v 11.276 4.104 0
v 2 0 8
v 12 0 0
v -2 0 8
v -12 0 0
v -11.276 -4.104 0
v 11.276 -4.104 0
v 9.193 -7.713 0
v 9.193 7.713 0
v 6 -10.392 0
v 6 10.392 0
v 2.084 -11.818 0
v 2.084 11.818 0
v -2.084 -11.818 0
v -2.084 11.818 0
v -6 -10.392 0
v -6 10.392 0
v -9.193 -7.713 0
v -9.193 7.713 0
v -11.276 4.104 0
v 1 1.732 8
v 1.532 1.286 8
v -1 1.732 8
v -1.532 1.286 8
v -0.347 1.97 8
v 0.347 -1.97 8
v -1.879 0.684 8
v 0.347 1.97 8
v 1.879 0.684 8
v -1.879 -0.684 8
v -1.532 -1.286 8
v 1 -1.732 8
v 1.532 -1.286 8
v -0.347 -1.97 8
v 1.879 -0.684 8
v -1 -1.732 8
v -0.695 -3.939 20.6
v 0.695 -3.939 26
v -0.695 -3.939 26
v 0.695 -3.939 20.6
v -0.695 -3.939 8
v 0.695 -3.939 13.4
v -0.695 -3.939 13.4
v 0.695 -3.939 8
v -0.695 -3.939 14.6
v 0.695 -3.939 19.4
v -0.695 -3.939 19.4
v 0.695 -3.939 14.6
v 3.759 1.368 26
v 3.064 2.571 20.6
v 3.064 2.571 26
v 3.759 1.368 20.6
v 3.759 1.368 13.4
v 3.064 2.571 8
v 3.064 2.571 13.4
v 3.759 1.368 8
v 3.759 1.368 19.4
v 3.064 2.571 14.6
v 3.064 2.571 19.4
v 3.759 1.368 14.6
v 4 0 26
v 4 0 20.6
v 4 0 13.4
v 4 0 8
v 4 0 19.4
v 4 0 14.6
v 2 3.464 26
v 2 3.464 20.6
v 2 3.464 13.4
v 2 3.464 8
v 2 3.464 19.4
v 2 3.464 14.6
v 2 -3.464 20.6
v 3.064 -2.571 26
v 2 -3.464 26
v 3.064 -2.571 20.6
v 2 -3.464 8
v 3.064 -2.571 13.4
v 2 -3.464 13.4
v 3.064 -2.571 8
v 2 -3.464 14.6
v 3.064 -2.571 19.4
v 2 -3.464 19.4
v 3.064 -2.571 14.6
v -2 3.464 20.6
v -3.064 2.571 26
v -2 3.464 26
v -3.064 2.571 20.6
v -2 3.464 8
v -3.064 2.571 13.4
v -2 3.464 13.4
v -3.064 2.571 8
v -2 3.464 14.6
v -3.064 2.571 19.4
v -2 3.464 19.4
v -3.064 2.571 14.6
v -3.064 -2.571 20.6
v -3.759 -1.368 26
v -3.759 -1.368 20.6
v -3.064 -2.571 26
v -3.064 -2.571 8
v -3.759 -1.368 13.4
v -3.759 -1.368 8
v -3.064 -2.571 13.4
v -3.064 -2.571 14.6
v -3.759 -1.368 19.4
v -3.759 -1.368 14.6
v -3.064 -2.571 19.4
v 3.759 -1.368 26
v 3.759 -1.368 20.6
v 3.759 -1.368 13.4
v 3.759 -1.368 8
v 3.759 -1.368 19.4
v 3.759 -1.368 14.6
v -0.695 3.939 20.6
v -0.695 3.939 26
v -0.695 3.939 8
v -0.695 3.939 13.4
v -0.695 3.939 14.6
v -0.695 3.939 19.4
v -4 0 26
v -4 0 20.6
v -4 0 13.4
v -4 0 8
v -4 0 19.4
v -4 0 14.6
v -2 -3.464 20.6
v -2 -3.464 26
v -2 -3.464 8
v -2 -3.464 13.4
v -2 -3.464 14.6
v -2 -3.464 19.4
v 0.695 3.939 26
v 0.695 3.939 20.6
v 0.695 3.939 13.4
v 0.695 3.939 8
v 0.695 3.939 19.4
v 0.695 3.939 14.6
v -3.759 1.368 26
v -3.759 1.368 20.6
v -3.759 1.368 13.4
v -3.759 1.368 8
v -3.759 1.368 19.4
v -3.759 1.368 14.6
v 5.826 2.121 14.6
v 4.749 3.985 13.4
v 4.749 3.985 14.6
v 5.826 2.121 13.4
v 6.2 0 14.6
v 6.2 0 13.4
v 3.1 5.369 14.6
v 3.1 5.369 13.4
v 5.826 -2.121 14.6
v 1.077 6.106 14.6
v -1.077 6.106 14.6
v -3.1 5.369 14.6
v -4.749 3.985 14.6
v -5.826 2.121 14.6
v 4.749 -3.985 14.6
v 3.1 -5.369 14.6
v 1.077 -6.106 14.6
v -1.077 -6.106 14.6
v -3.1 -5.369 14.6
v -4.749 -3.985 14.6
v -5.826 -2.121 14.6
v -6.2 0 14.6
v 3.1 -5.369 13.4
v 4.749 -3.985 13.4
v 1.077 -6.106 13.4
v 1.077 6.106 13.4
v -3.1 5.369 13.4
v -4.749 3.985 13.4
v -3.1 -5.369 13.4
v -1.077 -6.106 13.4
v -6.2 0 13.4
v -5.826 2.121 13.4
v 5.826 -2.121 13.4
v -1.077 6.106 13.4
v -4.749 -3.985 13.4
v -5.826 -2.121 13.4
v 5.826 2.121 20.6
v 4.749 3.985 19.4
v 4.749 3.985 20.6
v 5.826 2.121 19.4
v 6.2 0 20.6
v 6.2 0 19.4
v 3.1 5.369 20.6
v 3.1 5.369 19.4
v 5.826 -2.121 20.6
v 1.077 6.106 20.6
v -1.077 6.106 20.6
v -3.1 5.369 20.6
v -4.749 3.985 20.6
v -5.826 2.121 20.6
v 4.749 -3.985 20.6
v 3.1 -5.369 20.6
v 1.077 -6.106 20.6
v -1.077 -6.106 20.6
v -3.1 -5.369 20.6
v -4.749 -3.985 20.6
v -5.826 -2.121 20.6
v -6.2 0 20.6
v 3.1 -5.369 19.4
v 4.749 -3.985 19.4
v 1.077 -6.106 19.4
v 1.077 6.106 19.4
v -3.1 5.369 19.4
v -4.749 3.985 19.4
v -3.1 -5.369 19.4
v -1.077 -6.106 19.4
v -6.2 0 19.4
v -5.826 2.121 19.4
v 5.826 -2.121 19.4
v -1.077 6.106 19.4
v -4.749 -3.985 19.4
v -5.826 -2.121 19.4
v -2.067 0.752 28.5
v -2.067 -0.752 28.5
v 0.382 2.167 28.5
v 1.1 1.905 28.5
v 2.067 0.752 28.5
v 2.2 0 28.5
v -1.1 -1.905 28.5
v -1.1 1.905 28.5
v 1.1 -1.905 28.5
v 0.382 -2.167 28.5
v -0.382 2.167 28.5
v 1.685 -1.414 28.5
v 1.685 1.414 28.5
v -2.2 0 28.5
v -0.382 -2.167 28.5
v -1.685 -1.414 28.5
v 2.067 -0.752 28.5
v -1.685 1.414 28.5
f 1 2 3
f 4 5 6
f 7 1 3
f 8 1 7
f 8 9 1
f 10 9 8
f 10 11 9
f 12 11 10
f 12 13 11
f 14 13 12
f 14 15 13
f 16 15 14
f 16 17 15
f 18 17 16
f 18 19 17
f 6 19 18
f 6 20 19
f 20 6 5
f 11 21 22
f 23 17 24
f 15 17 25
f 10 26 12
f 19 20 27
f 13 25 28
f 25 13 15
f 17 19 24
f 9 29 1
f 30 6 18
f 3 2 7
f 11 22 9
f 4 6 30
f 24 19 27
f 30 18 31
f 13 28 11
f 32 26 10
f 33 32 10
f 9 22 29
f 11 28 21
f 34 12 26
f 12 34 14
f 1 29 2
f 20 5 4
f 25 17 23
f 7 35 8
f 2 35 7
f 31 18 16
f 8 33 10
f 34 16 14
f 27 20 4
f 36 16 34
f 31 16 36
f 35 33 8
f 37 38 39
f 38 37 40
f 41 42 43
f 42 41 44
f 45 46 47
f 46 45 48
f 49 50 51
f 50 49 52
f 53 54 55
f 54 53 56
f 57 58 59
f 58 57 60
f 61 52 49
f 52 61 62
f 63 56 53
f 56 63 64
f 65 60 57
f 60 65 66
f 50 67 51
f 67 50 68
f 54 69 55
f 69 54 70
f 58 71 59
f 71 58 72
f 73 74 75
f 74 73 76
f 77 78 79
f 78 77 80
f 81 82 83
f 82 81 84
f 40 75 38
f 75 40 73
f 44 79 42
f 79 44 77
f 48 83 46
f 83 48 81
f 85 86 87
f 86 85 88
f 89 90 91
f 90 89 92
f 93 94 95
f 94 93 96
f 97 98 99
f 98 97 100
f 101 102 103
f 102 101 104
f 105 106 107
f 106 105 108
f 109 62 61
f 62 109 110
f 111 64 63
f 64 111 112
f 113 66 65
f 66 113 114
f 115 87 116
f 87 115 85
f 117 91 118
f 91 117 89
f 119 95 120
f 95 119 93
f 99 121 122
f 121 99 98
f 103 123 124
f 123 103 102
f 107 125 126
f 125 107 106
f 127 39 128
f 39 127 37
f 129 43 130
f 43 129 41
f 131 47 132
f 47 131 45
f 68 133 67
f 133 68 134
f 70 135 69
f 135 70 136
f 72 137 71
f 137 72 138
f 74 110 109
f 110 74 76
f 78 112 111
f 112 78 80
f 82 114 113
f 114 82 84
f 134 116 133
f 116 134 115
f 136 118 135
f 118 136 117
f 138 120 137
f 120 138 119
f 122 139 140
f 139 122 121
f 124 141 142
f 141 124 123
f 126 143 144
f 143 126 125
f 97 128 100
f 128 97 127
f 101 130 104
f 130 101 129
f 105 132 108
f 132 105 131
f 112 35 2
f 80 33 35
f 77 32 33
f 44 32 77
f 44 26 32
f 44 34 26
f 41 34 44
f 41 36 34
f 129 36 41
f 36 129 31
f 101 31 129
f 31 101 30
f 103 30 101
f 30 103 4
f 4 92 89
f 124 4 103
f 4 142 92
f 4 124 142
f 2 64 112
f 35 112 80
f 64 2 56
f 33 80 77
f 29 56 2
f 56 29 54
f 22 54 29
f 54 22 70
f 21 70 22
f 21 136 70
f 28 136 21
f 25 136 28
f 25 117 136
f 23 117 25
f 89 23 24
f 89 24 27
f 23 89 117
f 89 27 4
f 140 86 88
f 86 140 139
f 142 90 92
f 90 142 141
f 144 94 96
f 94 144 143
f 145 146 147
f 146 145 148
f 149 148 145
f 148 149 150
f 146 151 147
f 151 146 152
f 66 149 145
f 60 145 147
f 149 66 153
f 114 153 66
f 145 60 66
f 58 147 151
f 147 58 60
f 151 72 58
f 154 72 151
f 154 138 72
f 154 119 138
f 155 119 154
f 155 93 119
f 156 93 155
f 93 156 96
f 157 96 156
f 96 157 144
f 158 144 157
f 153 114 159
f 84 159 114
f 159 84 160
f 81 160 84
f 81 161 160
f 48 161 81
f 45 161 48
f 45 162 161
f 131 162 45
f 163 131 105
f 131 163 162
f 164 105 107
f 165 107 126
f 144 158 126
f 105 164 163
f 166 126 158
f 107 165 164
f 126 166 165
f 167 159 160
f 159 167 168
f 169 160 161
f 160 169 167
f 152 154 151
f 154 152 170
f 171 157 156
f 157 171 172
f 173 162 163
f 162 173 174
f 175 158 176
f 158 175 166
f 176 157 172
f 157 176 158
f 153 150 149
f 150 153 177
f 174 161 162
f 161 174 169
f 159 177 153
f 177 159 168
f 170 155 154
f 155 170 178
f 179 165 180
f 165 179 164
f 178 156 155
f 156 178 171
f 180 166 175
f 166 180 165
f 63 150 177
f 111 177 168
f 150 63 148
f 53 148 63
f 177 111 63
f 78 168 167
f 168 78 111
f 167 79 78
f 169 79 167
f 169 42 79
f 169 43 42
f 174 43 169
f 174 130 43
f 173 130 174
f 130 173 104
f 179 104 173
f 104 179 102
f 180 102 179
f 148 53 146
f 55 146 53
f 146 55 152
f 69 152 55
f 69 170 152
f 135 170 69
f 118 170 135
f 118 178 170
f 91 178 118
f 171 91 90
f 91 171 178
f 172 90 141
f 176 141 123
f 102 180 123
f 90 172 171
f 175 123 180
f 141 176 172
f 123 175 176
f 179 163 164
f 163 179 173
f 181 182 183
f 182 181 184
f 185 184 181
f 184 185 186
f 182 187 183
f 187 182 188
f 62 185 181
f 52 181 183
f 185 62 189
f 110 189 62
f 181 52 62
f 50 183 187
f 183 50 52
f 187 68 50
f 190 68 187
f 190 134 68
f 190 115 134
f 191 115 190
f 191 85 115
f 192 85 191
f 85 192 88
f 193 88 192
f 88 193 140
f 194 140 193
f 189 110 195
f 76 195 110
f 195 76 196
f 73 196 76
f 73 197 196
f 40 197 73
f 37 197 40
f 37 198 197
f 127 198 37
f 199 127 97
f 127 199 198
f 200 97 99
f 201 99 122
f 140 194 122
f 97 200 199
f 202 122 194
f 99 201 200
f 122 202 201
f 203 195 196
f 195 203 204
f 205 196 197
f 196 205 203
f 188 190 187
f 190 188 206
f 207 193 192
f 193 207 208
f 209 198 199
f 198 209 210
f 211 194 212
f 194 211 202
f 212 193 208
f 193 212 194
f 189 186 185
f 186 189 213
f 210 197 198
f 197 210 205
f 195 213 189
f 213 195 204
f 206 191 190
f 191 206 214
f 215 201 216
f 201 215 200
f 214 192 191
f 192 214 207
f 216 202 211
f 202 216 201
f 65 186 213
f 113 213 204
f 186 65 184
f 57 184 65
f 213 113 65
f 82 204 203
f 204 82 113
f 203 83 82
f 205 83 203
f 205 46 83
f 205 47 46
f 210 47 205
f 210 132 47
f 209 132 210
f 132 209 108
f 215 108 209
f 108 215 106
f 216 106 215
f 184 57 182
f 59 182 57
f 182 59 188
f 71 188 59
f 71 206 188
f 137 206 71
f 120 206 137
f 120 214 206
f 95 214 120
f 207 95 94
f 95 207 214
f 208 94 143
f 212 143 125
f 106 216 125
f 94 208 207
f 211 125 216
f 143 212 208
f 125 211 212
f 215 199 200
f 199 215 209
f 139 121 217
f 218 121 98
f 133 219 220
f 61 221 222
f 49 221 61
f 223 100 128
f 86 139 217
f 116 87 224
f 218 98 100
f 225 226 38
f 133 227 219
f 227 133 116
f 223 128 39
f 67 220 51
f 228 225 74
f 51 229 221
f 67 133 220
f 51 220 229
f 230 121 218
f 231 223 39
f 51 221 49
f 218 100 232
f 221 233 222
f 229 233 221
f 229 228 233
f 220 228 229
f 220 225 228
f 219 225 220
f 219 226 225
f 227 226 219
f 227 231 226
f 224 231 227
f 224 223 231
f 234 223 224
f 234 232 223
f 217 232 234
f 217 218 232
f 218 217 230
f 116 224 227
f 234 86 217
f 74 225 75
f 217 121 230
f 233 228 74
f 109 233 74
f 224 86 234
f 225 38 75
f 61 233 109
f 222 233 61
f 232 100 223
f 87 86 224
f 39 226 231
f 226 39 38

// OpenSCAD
$fn=18;

head_h = 8;
head_r_base = 12;
head_r_top = 2;

shank_h = 18;
shank_r = 4;

rib_th = 1.2;
rib_r = 6.2;
rib_z1 = 6;
rib_z2 = 12;

tip_h = 2.5;
tip_r = 2.2;

module frustum(h, r1, r2) {
    cylinder(h=h, r1=r1, r2=r2, center=false);
}

module rib(zpos) {
    translate([0,0,zpos - rib_th/2])
        cylinder(h=rib_th, r=rib_r, center=false);
}

module shank() {
    union() {
        cylinder(h=shank_h, r=shank_r, center=false);
        rib(rib_z1);
        rib(rib_z2);
        translate([0,0,shank_h])
            frustum(tip_h, shank_r, tip_r);
    }
}

module head() {
    union() {
        frustum(head_h, head_r_base, head_r_top);
        translate([0,0,head_h])
            sphere(r=head_r_top);
    }
}

union() {
    translate([0,0,0]) head();
    translate([0,0,head_h]) shank();
}
